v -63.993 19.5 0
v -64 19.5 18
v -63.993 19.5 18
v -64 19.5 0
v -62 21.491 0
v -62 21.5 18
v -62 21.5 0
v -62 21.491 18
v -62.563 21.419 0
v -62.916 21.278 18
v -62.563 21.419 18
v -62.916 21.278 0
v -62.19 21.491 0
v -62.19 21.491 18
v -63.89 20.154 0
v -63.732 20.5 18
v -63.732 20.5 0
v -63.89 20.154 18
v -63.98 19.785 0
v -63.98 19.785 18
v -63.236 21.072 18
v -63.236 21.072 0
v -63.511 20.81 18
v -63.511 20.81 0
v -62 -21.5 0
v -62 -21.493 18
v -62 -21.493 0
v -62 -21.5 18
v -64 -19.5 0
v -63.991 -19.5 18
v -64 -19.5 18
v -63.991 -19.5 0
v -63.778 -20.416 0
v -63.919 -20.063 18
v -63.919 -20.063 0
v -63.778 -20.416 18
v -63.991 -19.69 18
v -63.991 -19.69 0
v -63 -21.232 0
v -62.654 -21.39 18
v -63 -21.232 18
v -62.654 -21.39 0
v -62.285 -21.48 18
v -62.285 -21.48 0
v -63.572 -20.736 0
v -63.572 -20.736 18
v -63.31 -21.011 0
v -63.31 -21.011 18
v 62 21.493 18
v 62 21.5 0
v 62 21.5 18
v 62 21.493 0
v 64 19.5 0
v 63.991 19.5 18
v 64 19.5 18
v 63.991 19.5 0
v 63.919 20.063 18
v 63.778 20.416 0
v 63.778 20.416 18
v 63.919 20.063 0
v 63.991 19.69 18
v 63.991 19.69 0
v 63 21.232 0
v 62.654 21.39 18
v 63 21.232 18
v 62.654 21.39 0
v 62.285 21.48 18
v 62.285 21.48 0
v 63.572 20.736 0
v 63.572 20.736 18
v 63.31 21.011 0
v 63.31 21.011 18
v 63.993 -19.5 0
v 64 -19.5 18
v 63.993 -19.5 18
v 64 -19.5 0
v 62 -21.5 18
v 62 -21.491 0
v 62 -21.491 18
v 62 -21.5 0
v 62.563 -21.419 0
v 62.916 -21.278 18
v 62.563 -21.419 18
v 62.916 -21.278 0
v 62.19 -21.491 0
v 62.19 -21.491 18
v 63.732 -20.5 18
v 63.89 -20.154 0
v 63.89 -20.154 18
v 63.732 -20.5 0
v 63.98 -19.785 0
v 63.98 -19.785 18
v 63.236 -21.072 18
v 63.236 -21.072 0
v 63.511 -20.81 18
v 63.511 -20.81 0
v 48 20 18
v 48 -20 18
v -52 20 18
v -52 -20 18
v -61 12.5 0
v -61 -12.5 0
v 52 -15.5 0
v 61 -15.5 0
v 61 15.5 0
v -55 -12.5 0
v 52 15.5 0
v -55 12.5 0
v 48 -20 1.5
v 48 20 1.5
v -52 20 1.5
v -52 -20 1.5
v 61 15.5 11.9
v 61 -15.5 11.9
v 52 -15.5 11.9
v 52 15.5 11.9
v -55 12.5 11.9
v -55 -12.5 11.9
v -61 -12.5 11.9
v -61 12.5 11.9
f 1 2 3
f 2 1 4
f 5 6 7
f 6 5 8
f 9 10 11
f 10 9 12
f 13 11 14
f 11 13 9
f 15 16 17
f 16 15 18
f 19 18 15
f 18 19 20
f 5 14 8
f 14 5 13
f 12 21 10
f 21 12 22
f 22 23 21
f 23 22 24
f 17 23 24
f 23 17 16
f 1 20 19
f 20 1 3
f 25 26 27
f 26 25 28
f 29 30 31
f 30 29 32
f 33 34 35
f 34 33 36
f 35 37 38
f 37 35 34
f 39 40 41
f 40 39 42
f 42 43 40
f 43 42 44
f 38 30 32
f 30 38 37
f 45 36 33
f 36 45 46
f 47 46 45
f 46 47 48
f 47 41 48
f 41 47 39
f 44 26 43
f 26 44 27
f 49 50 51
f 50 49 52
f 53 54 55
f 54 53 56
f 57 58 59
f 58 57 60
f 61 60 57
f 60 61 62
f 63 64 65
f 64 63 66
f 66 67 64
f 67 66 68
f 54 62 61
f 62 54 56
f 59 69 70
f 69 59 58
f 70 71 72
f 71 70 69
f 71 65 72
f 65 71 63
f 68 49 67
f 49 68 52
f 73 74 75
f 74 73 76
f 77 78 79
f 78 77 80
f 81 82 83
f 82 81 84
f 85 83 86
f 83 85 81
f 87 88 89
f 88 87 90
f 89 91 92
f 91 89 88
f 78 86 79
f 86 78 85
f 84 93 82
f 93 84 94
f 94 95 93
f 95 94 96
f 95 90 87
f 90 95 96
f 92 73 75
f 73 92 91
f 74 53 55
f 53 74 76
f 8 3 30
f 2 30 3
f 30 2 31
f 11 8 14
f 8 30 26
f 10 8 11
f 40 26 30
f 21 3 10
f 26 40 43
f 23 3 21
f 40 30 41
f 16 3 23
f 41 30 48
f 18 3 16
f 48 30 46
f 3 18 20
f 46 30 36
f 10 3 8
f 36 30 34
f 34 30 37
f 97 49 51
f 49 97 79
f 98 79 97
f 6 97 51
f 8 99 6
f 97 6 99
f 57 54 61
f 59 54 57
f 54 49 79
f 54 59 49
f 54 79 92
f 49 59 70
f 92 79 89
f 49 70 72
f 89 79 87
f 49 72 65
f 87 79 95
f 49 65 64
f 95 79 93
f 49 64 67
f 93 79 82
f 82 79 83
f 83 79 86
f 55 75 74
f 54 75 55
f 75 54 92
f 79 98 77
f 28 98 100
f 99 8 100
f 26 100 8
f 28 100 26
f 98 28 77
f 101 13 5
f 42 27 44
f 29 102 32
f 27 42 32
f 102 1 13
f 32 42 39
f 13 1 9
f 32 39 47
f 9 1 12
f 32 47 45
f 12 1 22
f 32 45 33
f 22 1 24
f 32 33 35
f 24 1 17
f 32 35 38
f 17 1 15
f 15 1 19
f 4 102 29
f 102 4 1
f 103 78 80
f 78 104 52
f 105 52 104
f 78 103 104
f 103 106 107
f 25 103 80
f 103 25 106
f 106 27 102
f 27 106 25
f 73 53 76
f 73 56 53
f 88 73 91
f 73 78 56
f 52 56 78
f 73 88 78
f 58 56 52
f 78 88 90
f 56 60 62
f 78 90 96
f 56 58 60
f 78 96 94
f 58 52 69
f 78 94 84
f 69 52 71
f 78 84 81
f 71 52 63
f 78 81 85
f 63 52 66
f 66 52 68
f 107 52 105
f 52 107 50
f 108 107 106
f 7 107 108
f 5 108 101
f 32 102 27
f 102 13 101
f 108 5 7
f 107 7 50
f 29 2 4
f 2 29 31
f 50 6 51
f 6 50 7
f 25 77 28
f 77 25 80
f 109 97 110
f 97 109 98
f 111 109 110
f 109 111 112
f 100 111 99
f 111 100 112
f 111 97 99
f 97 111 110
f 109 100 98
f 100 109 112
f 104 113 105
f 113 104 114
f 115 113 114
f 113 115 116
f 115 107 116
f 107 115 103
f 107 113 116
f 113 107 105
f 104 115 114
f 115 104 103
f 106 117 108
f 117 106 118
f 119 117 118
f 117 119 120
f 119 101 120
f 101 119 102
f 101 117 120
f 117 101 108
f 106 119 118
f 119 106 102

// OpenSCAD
// file: ../Parts/rounder.scad
// rounder.scad
// cutting tool for rounding off corners with a cylinder

//---------------------
module rounder(
r=10,   // radius
h=10,   // height
f=22,    // $fn
extra=0.01  // extra size for the cube
){

difference(){
  translate([-extra,-extra,-extra])
  cube([r+extra,r+extra,h+2*extra]);
  translate([r,r,-1])
  cylinder(r=r,h=h+2,$fn=f);
}

}

//---------------------------------------------------------------------------
module bevel(x=1,y=1,h=10){

linear_extrude(height=h)
polygon(points=[[0,0],[x,0],[0,y]]);
    
}
  

//========================

rounder();

//========================
// main file
//=================================================================================
// KeyBox.scad
// 
// Rooftop box for spare Vingilot key
//
// Dr Tom Flint, 19 Dec 2023
//=================================================================================


use <../Parts/rounder.scad>

thick = 1.5;

// box innner dimensions
x0=125;
y0=40;
z0=15;

// big magnet
x1=9;
y1=31;
z1=12;

// small magnet
x2=6;
y2=25;
z2=12;

r0=2;
r1=r0+thick;

tol=0.25;

//---------------------------------------------------------------------------------
module KeyBox(){

  difference(){
    translate([0,0,z0/2+thick])
    cube([x0+2*thick,y0+2*thick,z0+2*thick],center=true);
    // keyhole
    translate([-2,0,z0/2+2*thick])
    cube([100,40,z0+2*thick],center=true);
    // big magnet
    translate([x0/2-thick-x1/2,0,z1/2-0.1])
    cube([x1,y1,z1],center=true);
    // small magnet
    translate([-x0/2+thick+x2/2,0,z2/2-0.1])
    cube([x2,y2,z2],center=true);

    translate([-x0/2-thick,y0/2+thick,-1])
    rotate([0,0,-90])
    rounder(r=r0,h=z0+10,f=33);
    translate([-x0/2-thick,-y0/2-thick,-1])
    rotate([0,0,0])
    rounder(r=r0,h=z0+10,f=33);
    
    translate([x0/2+thick,y0/2+thick,-1])
    rotate([0,0,180])
    rounder(r=r0,h=z0+10,f=33);
    translate([x0/2+thick,-y0/2-thick,-1])
    rotate([0,0,90])
    rounder(r=r0,h=z0+10,f=33);
	}
}

//---------------------------------------------------------------------------------
module KeyLid(){

  difference(){
    translate([0,0,z0/2+1.5*thick])
    cube([x0+4*thick,y0+4*thick,z0+3*thick],center=true);
    // hole
    translate([0,0,z0/2+thick])
    cube([x0+2*thick+2*tol,y0+2*thick+2*tol,z0+2*thick+2*tol],center=true);

    translate([-x0/2-2*thick,y0/2+2*thick,-thick])
    rotate([0,0,-90])
    rounder(r=r1,h=z0+10,f=33);    
    translate([-x0/2-2*thick,-y0/2-2*thick,-thick])
    rotate([0,0,0])
    rounder(r=r1,h=z0+10,f=33);
    
    translate([x0/2+2*thick,y0/2+2*thick,-thick])
    rotate([0,0,180])
    rounder(r=r1,h=z0+10,f=33);
    translate([x0/2+2*thick,-y0/2-2*thick,-thick])
    rotate([0,0,90])
    rounder(r=r1,h=z0+10,f=33);

    translate([0,-2,z0+3*thick-0.3])
    linear_extrude(height=0.4,scale=1)
    text("Vingilot", font = "Open Sans:style=Bold", size=18,halign="center",valign="center",spacing=1.1);

	}
  
  // fillets inside
  translate([-x0/2-thick-tol,y0/2+thick+tol,0])
  rotate([0,0,-90])
  rounder(r=r0,h=z0+2*thick+tol,f=33);
  translate([-x0/2-thick-tol,-y0/2-thick-tol,0])
  rotate([0,0,0])
  rounder(r=r0,h=z0+2*thick+tol,f=33);
  
  translate([x0/2+thick+tol,y0/2+thick+tol,0])
  rotate([0,0,180])
  rounder(r=r0,h=z0+2*thick+tol,f=33);
  translate([x0/2+thick+tol,-y0/2-thick-tol,0])
  rotate([0,0,90])
  rounder(r=r0,h=z0+2*thick+tol,f=33);

}


//=================================================================================

xcut=100;
ycut=0;
zcut=-30;

//~ difference(){
  //~ union(){
    //~ color("cyan")
    //~ KeyBox();
    //~ KeyLid();
  //~ }
  //~ translate([xcut-100,ycut-50,zcut-25])
  //~ cube([200,100,50],center=true);
//~ }

//~ KeyLid();
KeyBox();

//=================================================================================
